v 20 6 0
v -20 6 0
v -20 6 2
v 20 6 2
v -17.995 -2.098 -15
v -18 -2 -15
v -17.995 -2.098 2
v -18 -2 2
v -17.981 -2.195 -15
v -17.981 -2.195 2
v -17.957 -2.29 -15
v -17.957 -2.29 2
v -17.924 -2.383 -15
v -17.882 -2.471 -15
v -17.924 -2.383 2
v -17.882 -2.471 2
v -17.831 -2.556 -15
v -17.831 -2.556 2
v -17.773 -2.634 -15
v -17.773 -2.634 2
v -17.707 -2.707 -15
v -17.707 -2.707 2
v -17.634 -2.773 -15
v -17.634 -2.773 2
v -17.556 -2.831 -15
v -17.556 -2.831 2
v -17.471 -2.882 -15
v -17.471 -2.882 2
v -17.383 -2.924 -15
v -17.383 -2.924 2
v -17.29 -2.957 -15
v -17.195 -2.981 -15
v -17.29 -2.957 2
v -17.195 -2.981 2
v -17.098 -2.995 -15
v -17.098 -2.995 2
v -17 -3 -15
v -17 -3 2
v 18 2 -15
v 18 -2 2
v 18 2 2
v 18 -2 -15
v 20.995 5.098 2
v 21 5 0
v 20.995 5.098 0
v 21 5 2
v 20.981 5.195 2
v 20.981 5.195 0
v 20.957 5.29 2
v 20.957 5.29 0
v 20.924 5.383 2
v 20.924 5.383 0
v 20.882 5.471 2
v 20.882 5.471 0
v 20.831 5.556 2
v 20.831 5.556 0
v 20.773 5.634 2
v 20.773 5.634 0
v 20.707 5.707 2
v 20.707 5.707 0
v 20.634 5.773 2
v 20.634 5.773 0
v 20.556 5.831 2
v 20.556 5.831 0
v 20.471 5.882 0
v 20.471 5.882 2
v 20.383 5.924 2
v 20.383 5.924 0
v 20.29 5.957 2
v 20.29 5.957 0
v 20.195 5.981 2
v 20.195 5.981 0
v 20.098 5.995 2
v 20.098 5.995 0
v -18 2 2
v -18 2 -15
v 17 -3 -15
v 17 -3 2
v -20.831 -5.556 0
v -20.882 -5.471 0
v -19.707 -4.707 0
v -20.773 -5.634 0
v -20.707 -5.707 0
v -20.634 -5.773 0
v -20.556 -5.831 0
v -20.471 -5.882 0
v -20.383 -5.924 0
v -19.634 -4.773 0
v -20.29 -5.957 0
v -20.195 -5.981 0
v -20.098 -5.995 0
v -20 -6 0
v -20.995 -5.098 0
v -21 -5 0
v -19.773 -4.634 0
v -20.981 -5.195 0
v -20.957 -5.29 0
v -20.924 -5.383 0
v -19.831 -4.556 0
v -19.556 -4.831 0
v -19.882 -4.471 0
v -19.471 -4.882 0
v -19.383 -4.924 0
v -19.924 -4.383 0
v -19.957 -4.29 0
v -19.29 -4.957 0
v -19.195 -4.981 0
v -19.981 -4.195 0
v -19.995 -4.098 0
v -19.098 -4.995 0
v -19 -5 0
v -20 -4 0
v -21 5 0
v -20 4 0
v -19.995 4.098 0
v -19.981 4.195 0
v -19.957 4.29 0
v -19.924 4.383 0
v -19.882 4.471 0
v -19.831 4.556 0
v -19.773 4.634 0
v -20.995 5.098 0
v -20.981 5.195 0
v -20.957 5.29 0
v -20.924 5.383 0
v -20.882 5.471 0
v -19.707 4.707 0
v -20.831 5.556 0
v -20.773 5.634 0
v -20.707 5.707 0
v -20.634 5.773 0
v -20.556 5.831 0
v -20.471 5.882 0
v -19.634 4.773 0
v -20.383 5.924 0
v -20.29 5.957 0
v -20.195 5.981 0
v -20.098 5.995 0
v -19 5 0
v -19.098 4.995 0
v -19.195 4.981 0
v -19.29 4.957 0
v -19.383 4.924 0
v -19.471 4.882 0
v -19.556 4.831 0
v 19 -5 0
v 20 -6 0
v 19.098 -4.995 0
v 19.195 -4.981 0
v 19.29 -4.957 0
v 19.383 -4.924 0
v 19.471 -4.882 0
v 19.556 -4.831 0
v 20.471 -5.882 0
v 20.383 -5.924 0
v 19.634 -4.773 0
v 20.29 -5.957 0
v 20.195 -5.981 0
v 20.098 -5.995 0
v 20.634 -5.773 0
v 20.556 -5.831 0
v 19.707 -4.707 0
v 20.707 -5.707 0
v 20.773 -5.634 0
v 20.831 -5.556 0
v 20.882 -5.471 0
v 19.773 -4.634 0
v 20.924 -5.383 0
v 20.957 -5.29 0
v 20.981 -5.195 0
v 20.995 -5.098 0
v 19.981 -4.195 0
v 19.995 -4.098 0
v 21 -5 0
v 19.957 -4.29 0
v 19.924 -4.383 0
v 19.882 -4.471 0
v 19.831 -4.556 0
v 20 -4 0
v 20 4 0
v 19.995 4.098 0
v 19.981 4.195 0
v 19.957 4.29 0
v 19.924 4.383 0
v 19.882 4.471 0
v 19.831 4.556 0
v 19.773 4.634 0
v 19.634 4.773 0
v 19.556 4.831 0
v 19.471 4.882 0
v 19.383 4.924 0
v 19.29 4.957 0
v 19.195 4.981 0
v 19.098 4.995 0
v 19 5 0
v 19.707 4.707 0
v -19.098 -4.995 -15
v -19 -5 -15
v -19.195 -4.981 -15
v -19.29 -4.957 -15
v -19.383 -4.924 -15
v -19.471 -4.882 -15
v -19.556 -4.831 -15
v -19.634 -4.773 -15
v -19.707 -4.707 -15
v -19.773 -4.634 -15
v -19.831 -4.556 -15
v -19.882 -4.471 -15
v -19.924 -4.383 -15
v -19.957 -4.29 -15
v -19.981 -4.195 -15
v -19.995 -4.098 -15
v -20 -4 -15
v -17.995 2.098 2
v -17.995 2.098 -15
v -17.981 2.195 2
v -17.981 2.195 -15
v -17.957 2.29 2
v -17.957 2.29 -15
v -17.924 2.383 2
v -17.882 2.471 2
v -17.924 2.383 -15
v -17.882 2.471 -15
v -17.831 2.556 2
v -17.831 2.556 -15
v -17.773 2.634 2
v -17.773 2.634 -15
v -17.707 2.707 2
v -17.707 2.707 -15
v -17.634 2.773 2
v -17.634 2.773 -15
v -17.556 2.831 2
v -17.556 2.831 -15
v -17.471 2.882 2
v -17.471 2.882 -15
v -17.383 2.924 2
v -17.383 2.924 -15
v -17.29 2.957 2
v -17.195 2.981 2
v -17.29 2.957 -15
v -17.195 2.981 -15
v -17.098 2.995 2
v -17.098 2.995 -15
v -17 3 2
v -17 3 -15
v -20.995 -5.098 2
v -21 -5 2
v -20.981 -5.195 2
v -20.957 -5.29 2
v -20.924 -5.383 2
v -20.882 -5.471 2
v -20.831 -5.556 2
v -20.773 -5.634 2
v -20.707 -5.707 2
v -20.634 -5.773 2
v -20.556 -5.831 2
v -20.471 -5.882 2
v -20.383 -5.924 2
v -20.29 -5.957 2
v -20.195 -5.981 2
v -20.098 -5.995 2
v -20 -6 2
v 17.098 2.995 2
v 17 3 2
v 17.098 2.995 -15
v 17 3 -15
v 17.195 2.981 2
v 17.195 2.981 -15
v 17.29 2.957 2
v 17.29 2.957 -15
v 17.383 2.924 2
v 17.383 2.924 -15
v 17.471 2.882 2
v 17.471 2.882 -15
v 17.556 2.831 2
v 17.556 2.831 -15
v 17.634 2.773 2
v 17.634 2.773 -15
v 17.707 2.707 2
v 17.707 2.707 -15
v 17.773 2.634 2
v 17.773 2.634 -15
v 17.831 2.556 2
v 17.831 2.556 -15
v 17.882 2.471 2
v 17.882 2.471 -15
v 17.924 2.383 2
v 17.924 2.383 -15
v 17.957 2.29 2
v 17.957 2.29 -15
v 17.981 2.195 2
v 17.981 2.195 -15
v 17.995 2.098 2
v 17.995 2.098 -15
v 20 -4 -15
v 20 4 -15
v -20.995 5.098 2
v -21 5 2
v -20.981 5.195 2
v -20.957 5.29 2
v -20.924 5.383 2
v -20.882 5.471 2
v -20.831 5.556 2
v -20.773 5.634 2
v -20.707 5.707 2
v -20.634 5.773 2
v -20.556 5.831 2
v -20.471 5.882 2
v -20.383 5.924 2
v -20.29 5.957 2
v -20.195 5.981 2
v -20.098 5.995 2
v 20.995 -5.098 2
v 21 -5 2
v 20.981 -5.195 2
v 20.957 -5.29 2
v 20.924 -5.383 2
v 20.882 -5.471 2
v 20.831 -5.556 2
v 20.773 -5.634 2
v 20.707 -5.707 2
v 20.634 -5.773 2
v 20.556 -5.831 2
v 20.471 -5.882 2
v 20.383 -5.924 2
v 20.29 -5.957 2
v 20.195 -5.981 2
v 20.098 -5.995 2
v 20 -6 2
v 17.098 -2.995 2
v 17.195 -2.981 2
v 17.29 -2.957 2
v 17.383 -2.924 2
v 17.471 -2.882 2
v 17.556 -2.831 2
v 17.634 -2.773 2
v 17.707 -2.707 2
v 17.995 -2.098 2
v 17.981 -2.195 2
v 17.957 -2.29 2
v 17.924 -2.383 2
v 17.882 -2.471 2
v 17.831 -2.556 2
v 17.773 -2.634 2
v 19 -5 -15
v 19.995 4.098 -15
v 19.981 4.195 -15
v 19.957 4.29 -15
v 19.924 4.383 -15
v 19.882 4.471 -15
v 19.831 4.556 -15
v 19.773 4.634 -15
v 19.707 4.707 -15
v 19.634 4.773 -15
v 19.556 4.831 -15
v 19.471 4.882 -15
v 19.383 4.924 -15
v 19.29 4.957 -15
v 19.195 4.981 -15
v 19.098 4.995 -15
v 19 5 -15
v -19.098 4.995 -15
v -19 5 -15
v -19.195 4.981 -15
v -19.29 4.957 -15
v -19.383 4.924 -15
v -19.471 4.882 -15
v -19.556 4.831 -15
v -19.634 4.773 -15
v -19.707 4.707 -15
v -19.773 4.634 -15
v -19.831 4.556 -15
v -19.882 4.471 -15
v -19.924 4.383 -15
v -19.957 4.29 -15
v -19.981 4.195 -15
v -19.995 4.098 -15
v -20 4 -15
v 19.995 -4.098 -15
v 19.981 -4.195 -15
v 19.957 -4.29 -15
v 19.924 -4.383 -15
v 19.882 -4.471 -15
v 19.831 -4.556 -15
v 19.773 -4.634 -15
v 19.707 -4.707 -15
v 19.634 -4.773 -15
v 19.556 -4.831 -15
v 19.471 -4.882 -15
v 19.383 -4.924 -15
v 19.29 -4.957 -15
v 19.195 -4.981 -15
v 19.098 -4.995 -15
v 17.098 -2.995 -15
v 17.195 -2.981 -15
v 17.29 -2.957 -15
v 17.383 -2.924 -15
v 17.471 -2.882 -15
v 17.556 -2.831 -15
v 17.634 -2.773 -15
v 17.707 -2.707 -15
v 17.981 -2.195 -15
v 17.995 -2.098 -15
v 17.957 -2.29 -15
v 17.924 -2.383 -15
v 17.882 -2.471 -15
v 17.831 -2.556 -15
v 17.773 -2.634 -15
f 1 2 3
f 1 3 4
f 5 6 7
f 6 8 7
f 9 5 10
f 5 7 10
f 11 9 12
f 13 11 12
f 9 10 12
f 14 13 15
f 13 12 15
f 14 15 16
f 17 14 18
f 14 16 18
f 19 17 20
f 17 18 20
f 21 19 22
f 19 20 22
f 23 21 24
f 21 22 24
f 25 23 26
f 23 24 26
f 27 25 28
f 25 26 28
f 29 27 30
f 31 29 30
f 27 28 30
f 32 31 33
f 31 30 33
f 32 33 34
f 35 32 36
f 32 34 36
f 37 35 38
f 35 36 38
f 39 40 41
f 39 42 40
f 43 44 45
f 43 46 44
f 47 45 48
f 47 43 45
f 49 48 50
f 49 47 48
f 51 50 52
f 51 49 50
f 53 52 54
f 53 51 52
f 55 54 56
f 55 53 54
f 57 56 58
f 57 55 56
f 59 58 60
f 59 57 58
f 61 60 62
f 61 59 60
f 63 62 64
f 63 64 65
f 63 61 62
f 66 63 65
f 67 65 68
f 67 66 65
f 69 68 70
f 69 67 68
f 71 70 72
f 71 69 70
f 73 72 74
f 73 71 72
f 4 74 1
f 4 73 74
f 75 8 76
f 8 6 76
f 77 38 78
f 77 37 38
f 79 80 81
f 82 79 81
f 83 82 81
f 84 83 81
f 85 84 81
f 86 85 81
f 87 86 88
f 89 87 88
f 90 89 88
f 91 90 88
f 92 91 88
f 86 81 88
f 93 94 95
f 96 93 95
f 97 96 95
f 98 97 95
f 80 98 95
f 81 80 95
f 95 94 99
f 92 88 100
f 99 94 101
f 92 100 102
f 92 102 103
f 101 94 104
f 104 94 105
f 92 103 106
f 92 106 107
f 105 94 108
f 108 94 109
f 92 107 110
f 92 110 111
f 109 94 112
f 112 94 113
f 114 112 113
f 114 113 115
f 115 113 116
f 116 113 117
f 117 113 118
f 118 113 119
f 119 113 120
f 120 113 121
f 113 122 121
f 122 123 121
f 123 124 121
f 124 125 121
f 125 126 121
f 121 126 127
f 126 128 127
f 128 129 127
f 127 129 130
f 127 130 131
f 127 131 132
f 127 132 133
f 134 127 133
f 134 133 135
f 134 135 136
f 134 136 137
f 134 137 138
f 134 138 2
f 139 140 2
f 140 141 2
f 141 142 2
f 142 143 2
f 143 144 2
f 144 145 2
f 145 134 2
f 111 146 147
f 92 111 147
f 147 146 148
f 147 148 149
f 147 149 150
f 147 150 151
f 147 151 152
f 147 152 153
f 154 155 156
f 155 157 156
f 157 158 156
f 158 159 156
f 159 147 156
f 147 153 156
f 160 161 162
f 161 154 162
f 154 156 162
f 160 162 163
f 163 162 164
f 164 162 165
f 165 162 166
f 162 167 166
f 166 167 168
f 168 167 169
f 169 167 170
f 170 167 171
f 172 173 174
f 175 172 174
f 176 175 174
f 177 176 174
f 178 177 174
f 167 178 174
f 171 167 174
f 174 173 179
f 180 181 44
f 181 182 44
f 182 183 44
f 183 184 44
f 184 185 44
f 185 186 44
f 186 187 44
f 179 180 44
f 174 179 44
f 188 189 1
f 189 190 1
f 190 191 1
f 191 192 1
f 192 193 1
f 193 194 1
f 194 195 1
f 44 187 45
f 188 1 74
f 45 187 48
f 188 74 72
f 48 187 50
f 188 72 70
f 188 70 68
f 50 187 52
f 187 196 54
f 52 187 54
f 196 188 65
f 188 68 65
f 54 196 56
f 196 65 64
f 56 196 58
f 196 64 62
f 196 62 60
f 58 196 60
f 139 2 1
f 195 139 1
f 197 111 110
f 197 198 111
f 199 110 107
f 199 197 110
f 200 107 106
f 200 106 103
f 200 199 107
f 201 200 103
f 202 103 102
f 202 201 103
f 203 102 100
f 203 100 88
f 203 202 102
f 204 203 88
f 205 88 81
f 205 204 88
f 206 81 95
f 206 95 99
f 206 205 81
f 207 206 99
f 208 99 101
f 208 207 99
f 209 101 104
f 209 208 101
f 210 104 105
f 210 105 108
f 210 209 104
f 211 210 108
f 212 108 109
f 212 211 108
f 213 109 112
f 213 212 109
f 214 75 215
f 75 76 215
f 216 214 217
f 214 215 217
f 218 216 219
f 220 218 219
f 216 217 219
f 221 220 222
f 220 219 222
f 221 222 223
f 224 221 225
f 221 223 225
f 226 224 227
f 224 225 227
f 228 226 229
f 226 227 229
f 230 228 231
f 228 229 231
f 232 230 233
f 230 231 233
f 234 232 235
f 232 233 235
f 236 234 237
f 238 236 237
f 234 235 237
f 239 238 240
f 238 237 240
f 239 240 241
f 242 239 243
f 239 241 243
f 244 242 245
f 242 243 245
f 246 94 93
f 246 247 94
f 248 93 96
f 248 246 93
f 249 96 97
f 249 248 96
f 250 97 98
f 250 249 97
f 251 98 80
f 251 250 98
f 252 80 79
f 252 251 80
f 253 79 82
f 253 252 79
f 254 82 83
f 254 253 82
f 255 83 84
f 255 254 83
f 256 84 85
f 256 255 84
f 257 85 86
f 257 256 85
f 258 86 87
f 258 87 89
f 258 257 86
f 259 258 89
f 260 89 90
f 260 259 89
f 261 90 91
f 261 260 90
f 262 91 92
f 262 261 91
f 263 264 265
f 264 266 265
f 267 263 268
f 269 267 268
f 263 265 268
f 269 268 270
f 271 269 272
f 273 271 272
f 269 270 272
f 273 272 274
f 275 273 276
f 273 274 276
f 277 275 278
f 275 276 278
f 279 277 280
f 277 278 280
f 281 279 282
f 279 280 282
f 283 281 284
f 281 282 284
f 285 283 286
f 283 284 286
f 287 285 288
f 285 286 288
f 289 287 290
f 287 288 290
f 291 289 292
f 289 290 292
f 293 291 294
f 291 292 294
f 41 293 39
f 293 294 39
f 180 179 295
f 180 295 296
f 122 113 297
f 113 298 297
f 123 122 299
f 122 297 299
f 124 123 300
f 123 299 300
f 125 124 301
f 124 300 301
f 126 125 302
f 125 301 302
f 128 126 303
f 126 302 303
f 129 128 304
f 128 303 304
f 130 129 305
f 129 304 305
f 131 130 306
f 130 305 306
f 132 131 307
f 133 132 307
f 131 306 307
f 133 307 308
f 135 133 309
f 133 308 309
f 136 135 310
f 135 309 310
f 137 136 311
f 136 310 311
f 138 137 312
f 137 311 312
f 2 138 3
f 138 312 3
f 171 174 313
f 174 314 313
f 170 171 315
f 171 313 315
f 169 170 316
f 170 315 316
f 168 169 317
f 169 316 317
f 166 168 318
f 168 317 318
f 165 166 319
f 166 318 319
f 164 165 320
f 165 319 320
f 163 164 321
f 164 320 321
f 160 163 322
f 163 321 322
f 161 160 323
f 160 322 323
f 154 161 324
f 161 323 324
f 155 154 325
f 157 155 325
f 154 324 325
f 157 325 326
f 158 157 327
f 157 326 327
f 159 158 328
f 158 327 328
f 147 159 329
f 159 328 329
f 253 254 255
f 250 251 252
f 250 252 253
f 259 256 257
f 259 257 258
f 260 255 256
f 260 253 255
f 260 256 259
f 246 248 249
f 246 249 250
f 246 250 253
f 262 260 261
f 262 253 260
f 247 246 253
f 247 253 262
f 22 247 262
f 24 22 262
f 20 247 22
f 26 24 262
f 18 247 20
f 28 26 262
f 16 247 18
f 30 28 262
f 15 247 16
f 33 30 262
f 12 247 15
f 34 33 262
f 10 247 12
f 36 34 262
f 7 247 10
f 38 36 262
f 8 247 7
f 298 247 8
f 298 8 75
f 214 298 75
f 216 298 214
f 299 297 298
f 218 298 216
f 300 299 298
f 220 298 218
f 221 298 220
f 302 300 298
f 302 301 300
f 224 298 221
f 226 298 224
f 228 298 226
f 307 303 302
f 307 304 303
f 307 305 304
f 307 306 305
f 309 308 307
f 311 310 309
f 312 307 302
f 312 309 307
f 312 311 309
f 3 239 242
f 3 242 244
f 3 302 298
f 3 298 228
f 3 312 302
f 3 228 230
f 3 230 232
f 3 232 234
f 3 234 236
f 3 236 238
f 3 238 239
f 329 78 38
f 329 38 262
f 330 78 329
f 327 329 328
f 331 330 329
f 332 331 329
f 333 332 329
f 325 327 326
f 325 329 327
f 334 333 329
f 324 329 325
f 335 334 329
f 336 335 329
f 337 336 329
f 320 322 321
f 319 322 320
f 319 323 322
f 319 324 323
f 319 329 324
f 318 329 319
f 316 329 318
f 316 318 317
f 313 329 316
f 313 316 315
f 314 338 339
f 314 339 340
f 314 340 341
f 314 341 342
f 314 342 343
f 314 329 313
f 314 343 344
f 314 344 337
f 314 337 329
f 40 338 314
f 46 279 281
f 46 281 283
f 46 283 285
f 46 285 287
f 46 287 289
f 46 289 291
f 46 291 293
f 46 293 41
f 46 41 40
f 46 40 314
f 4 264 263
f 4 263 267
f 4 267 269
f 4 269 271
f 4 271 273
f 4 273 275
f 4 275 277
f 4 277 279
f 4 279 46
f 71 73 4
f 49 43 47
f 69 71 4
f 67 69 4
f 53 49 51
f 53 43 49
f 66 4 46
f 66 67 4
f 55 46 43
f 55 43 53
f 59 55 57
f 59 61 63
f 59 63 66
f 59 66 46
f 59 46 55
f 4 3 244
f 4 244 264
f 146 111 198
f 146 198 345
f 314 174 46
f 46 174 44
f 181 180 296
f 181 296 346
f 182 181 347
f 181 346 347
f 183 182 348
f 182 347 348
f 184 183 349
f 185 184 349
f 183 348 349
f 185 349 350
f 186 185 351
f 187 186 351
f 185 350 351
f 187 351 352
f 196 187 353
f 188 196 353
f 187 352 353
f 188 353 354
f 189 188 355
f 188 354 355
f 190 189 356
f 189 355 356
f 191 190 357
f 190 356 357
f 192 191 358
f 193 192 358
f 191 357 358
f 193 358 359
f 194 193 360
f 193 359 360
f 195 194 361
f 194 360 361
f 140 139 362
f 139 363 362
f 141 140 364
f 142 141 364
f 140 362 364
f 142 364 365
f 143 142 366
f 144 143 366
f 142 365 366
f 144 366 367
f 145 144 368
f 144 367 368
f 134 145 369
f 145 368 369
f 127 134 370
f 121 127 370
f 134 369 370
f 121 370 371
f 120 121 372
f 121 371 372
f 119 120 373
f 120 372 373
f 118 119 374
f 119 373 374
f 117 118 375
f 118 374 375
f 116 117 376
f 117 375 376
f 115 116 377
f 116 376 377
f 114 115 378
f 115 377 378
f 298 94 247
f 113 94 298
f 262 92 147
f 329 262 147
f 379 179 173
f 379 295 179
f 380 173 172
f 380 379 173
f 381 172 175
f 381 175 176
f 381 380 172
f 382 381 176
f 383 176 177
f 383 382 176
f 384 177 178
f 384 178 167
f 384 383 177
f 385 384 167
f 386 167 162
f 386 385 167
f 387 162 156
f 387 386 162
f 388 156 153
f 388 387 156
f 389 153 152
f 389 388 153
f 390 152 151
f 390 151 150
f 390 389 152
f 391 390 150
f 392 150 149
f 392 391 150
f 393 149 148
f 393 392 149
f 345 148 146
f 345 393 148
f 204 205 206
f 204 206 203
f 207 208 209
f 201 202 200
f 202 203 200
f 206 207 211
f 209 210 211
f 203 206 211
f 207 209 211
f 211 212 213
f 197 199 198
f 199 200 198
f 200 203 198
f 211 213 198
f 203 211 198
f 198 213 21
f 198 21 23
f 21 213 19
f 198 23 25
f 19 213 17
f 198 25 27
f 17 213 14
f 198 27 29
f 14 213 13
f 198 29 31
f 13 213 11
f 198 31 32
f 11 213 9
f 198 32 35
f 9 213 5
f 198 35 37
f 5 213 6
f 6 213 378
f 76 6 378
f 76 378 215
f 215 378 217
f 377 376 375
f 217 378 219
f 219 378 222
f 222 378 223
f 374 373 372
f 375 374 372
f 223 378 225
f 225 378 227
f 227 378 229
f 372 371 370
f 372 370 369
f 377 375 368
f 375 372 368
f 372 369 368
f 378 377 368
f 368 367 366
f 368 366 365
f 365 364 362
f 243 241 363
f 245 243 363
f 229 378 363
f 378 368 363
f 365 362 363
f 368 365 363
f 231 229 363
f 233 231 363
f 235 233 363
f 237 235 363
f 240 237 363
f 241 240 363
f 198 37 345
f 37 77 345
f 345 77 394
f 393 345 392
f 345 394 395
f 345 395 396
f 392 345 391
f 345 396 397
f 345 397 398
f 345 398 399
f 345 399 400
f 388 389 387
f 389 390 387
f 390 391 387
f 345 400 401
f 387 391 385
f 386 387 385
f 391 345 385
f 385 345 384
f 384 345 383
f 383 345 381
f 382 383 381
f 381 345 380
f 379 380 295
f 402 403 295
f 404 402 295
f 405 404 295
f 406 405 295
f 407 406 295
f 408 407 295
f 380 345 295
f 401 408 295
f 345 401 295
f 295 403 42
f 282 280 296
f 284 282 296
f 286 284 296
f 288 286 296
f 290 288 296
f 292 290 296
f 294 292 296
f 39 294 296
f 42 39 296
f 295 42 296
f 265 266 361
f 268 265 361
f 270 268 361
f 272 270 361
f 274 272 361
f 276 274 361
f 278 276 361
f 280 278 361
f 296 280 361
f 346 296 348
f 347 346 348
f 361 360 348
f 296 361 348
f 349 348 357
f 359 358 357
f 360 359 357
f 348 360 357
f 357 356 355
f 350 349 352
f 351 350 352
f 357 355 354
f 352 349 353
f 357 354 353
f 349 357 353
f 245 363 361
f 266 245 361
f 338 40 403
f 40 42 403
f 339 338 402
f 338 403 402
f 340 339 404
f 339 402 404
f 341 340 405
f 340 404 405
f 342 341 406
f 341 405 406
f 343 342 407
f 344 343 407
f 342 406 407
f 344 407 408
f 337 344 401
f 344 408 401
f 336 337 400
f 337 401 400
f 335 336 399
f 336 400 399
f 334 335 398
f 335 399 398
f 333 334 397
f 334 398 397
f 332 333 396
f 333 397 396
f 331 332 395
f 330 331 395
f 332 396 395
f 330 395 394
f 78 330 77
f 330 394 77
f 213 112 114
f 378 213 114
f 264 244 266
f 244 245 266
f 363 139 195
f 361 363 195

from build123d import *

# Parameters (mm, degrees)
F0_W     = 40
F0_H     = 10
F0_W_2   = 36
F0_H_2   = 6
F1_DEPTH = 15
F2_W     = 42
F2_H     = 12
F2_W_2   = 40
F2_H_2   = 10
F2_W_3   = 36
F2_H_3   = 6
F3_DEPTH = 2
F4_R     = 1


with BuildPart() as f1:
    # F0 (on Top) → F1 (new body)
    with BuildSketch(Plane.XY):
        Rectangle(F0_W, F0_H)
        Rectangle(F0_W_2, F0_H_2, mode=Mode.SUBTRACT)
    extrude(amount=-F1_DEPTH)

    # F2 (on face) → F3 (join)
    with BuildSketch(Plane.XY):
        Rectangle(F2_W, F2_H)
        Rectangle(F2_W_2, F2_H_2, mode=Mode.SUBTRACT)
        Rectangle(F2_W_2, F2_H_2)
        Rectangle(F2_W_3, F2_H_3, mode=Mode.SUBTRACT)
    extrude(amount=F3_DEPTH)

    # F4
    f4_edges = [f1.edges().sort_by_distance(p)[0] for p in [
        (21, 6, 1),
        (21, -6, 1),
        (-21, 6, 1),
        (-21, -6, 1),
        (20, 5, -7.5),
        (20, -5, -7.5),
        (-20, -5, -7.5),
        (-20, 5, -7.5),
        (18, 3, -6.5),
        (-18, 3, -6.5),
        (-18, -3, -6.5),
        (18, -3, -6.5),
    ]]
    fillet(f4_edges, radius=F4_R)


solid = f1.part
